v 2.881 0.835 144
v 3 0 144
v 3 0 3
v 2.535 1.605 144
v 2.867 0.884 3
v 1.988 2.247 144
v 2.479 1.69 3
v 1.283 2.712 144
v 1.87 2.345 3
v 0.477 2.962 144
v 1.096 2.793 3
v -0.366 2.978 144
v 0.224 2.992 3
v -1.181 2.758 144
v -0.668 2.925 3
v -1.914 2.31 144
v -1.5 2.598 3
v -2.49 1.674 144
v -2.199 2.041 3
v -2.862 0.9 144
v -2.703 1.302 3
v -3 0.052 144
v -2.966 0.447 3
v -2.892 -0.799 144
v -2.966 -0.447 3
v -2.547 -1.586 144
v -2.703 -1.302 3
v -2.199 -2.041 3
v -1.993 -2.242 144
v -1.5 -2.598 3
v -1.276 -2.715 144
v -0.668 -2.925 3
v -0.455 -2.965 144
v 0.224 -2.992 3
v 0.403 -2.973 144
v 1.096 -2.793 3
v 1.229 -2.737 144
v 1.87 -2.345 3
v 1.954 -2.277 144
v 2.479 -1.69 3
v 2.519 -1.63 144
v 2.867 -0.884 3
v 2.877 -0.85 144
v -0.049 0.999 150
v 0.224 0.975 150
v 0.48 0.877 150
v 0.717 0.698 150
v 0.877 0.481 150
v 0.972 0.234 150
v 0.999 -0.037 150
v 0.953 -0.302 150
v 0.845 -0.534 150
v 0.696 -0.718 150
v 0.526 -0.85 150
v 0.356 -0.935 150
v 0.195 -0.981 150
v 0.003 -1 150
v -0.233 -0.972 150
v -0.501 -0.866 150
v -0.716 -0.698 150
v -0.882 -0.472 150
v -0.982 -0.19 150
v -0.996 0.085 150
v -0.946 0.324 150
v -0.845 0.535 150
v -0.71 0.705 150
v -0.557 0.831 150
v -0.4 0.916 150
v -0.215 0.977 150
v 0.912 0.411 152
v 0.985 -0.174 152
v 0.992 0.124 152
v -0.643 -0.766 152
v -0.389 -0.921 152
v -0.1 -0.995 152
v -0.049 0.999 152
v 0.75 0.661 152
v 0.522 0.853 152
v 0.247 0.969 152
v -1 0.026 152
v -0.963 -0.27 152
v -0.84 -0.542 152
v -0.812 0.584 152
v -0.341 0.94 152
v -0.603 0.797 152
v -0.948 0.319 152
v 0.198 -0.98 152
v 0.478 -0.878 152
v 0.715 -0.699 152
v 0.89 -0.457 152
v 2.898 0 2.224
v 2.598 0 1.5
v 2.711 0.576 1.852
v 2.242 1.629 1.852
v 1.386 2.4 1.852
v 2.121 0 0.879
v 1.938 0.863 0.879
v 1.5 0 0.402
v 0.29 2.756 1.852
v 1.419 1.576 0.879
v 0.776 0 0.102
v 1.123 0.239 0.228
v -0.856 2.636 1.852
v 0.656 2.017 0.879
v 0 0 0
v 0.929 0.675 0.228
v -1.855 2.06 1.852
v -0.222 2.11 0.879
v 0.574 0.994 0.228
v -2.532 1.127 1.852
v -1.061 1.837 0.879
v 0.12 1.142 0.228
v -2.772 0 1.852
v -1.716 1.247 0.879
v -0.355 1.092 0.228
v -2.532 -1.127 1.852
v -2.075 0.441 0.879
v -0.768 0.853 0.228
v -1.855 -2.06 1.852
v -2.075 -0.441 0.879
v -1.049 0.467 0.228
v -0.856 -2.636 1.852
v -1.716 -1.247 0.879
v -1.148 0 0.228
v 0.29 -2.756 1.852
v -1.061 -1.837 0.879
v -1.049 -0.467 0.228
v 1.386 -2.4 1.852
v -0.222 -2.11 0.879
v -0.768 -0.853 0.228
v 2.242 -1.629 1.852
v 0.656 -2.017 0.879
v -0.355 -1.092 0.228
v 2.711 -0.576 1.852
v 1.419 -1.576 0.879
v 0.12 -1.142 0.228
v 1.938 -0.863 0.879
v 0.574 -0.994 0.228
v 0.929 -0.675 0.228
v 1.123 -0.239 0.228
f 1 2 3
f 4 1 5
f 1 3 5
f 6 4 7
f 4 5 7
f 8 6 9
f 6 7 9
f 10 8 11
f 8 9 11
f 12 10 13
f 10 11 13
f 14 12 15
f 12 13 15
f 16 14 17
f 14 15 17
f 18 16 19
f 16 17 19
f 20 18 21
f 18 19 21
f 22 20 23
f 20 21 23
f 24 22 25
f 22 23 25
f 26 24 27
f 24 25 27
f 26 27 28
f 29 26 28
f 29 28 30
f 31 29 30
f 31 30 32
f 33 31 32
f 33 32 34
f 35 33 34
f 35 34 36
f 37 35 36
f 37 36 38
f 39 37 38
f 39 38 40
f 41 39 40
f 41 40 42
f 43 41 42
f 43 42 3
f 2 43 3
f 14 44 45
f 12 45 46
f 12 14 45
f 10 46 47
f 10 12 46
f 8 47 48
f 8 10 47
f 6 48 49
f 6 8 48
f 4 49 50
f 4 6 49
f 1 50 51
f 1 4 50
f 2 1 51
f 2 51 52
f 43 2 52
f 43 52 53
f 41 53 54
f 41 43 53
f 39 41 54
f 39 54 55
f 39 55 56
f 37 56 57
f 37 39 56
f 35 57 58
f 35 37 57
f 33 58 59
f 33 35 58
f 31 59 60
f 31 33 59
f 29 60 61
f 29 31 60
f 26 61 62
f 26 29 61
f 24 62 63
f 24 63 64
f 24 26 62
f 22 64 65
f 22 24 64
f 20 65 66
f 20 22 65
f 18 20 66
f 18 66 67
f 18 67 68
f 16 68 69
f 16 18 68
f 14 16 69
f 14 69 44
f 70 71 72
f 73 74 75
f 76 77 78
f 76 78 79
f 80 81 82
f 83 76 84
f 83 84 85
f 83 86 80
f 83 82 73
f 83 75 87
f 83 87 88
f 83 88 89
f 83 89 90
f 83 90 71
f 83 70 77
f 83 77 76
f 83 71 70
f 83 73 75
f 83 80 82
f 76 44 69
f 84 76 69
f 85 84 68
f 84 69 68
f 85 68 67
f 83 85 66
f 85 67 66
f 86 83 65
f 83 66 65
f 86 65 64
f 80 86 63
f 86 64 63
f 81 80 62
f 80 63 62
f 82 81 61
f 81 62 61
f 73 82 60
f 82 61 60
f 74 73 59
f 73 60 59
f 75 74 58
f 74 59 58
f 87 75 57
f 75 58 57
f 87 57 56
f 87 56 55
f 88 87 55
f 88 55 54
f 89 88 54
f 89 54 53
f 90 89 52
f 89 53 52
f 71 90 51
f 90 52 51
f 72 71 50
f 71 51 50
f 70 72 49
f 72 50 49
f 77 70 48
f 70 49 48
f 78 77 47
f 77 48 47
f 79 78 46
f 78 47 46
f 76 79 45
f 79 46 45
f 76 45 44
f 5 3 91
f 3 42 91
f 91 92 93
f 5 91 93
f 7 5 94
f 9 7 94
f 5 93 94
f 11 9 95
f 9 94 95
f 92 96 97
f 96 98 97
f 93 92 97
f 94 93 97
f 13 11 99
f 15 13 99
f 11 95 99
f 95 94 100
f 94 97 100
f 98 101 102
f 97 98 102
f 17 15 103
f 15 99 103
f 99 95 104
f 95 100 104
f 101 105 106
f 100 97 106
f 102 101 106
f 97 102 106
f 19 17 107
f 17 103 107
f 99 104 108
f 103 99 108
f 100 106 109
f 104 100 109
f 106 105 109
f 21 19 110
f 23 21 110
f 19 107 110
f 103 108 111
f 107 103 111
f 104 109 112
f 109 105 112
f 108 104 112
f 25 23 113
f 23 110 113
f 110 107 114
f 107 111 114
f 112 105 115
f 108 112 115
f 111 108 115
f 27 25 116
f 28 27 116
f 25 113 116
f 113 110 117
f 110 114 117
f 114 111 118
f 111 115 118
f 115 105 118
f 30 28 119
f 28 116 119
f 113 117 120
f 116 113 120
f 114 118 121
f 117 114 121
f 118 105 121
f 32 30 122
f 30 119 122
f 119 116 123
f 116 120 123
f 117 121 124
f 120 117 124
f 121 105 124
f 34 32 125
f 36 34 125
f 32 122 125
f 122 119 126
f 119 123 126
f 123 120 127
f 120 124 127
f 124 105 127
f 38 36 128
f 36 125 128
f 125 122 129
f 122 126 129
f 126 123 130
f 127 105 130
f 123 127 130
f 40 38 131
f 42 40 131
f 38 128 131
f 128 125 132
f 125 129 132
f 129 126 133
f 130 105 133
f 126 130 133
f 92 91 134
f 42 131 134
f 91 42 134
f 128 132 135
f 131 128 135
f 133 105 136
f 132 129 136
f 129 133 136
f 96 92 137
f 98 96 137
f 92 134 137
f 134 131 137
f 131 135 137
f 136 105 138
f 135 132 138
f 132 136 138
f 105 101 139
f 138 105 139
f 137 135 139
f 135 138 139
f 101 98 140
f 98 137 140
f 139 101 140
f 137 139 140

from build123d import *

# Parameters (mm, degrees)
CROQUIS3_R              = 3
SALIENTE_EXTRUIR2_DEPTH = 144
REDONDEO2_R             = 3
CROQUIS6_R              = 1
SALIENTE_EXTRUIR3_DEPTH = 2


with BuildPart() as part:
    # Croquis3 → Saliente-Extruir2 (new body)
    with BuildSketch(Plane.XY):
        Circle(CROQUIS3_R)
    extrude(amount=SALIENTE_EXTRUIR2_DEPTH)

    # Redondeo2
    redondeo2_edges = [part.edges().sort_by_distance(p)[0] for p in [
        (-3, 0, 0),
    ]]
    fillet(redondeo2_edges, radius=REDONDEO2_R)

    # Recubrir2: read off the stored shape, not the designer's step
    # Recubrir2: loft between two sections, ruled curve by curve
    recubrir2_from = [
        Edge.make_bspline([(-0.049268062, 0.998785592, 150), (1.948303122, 1.097321715, 150), (2.046839245, -0.900249468, 150), (0.049268062, -0.998785592, 150), (-1.948303122, -1.097321715, 150), (-2.046839245, 0.900249468, 150), (-0.049268062, 0.998785592, 150)], [0, 0, 0, 0, 0.5, 0.5, 0.5, 1, 1, 1, 1], 3, [1, 0.333333333, 0.333333333, 1, 0.333333333, 0.333333333, 1]),
    ]
    recubrir2_to = [
        Edge.make_bspline([(-1.18105567, 2.757735938, 144), (4.334416207, 5.119847278, 144), (6.696527546, -0.395624599, 144), (1.18105567, -2.757735938, 144), (-4.334416207, -5.119847278, 144), (-6.696527546, 0.395624599, 144), (-1.18105567, 2.757735938, 144)], [0, 0, 0, 0, 0.5, 0.5, 0.5, 1, 1, 1, 1], 3, [1, 0.333333333, 0.333333333, 1, 0.333333333, 0.333333333, 1]),
    ]
    recubrir2 = Solid(Shell([*[Face.make_surface_from_curves(recubrir2_from[k], recubrir2_to[k]) for k in range(1)], Face(Wire(recubrir2_from)), Face(Wire(recubrir2_to))]))
    add(recubrir2)

    # Croquis6 → Saliente-Extruir3 (add)
    with BuildSketch(Plane.XY.offset(150)):
        with Locations(Location((0, 0, 0), (0, 0, 92.823995247))):
            Circle(CROQUIS6_R)
    extrude(amount=SALIENTE_EXTRUIR3_DEPTH)


solid = part.part
